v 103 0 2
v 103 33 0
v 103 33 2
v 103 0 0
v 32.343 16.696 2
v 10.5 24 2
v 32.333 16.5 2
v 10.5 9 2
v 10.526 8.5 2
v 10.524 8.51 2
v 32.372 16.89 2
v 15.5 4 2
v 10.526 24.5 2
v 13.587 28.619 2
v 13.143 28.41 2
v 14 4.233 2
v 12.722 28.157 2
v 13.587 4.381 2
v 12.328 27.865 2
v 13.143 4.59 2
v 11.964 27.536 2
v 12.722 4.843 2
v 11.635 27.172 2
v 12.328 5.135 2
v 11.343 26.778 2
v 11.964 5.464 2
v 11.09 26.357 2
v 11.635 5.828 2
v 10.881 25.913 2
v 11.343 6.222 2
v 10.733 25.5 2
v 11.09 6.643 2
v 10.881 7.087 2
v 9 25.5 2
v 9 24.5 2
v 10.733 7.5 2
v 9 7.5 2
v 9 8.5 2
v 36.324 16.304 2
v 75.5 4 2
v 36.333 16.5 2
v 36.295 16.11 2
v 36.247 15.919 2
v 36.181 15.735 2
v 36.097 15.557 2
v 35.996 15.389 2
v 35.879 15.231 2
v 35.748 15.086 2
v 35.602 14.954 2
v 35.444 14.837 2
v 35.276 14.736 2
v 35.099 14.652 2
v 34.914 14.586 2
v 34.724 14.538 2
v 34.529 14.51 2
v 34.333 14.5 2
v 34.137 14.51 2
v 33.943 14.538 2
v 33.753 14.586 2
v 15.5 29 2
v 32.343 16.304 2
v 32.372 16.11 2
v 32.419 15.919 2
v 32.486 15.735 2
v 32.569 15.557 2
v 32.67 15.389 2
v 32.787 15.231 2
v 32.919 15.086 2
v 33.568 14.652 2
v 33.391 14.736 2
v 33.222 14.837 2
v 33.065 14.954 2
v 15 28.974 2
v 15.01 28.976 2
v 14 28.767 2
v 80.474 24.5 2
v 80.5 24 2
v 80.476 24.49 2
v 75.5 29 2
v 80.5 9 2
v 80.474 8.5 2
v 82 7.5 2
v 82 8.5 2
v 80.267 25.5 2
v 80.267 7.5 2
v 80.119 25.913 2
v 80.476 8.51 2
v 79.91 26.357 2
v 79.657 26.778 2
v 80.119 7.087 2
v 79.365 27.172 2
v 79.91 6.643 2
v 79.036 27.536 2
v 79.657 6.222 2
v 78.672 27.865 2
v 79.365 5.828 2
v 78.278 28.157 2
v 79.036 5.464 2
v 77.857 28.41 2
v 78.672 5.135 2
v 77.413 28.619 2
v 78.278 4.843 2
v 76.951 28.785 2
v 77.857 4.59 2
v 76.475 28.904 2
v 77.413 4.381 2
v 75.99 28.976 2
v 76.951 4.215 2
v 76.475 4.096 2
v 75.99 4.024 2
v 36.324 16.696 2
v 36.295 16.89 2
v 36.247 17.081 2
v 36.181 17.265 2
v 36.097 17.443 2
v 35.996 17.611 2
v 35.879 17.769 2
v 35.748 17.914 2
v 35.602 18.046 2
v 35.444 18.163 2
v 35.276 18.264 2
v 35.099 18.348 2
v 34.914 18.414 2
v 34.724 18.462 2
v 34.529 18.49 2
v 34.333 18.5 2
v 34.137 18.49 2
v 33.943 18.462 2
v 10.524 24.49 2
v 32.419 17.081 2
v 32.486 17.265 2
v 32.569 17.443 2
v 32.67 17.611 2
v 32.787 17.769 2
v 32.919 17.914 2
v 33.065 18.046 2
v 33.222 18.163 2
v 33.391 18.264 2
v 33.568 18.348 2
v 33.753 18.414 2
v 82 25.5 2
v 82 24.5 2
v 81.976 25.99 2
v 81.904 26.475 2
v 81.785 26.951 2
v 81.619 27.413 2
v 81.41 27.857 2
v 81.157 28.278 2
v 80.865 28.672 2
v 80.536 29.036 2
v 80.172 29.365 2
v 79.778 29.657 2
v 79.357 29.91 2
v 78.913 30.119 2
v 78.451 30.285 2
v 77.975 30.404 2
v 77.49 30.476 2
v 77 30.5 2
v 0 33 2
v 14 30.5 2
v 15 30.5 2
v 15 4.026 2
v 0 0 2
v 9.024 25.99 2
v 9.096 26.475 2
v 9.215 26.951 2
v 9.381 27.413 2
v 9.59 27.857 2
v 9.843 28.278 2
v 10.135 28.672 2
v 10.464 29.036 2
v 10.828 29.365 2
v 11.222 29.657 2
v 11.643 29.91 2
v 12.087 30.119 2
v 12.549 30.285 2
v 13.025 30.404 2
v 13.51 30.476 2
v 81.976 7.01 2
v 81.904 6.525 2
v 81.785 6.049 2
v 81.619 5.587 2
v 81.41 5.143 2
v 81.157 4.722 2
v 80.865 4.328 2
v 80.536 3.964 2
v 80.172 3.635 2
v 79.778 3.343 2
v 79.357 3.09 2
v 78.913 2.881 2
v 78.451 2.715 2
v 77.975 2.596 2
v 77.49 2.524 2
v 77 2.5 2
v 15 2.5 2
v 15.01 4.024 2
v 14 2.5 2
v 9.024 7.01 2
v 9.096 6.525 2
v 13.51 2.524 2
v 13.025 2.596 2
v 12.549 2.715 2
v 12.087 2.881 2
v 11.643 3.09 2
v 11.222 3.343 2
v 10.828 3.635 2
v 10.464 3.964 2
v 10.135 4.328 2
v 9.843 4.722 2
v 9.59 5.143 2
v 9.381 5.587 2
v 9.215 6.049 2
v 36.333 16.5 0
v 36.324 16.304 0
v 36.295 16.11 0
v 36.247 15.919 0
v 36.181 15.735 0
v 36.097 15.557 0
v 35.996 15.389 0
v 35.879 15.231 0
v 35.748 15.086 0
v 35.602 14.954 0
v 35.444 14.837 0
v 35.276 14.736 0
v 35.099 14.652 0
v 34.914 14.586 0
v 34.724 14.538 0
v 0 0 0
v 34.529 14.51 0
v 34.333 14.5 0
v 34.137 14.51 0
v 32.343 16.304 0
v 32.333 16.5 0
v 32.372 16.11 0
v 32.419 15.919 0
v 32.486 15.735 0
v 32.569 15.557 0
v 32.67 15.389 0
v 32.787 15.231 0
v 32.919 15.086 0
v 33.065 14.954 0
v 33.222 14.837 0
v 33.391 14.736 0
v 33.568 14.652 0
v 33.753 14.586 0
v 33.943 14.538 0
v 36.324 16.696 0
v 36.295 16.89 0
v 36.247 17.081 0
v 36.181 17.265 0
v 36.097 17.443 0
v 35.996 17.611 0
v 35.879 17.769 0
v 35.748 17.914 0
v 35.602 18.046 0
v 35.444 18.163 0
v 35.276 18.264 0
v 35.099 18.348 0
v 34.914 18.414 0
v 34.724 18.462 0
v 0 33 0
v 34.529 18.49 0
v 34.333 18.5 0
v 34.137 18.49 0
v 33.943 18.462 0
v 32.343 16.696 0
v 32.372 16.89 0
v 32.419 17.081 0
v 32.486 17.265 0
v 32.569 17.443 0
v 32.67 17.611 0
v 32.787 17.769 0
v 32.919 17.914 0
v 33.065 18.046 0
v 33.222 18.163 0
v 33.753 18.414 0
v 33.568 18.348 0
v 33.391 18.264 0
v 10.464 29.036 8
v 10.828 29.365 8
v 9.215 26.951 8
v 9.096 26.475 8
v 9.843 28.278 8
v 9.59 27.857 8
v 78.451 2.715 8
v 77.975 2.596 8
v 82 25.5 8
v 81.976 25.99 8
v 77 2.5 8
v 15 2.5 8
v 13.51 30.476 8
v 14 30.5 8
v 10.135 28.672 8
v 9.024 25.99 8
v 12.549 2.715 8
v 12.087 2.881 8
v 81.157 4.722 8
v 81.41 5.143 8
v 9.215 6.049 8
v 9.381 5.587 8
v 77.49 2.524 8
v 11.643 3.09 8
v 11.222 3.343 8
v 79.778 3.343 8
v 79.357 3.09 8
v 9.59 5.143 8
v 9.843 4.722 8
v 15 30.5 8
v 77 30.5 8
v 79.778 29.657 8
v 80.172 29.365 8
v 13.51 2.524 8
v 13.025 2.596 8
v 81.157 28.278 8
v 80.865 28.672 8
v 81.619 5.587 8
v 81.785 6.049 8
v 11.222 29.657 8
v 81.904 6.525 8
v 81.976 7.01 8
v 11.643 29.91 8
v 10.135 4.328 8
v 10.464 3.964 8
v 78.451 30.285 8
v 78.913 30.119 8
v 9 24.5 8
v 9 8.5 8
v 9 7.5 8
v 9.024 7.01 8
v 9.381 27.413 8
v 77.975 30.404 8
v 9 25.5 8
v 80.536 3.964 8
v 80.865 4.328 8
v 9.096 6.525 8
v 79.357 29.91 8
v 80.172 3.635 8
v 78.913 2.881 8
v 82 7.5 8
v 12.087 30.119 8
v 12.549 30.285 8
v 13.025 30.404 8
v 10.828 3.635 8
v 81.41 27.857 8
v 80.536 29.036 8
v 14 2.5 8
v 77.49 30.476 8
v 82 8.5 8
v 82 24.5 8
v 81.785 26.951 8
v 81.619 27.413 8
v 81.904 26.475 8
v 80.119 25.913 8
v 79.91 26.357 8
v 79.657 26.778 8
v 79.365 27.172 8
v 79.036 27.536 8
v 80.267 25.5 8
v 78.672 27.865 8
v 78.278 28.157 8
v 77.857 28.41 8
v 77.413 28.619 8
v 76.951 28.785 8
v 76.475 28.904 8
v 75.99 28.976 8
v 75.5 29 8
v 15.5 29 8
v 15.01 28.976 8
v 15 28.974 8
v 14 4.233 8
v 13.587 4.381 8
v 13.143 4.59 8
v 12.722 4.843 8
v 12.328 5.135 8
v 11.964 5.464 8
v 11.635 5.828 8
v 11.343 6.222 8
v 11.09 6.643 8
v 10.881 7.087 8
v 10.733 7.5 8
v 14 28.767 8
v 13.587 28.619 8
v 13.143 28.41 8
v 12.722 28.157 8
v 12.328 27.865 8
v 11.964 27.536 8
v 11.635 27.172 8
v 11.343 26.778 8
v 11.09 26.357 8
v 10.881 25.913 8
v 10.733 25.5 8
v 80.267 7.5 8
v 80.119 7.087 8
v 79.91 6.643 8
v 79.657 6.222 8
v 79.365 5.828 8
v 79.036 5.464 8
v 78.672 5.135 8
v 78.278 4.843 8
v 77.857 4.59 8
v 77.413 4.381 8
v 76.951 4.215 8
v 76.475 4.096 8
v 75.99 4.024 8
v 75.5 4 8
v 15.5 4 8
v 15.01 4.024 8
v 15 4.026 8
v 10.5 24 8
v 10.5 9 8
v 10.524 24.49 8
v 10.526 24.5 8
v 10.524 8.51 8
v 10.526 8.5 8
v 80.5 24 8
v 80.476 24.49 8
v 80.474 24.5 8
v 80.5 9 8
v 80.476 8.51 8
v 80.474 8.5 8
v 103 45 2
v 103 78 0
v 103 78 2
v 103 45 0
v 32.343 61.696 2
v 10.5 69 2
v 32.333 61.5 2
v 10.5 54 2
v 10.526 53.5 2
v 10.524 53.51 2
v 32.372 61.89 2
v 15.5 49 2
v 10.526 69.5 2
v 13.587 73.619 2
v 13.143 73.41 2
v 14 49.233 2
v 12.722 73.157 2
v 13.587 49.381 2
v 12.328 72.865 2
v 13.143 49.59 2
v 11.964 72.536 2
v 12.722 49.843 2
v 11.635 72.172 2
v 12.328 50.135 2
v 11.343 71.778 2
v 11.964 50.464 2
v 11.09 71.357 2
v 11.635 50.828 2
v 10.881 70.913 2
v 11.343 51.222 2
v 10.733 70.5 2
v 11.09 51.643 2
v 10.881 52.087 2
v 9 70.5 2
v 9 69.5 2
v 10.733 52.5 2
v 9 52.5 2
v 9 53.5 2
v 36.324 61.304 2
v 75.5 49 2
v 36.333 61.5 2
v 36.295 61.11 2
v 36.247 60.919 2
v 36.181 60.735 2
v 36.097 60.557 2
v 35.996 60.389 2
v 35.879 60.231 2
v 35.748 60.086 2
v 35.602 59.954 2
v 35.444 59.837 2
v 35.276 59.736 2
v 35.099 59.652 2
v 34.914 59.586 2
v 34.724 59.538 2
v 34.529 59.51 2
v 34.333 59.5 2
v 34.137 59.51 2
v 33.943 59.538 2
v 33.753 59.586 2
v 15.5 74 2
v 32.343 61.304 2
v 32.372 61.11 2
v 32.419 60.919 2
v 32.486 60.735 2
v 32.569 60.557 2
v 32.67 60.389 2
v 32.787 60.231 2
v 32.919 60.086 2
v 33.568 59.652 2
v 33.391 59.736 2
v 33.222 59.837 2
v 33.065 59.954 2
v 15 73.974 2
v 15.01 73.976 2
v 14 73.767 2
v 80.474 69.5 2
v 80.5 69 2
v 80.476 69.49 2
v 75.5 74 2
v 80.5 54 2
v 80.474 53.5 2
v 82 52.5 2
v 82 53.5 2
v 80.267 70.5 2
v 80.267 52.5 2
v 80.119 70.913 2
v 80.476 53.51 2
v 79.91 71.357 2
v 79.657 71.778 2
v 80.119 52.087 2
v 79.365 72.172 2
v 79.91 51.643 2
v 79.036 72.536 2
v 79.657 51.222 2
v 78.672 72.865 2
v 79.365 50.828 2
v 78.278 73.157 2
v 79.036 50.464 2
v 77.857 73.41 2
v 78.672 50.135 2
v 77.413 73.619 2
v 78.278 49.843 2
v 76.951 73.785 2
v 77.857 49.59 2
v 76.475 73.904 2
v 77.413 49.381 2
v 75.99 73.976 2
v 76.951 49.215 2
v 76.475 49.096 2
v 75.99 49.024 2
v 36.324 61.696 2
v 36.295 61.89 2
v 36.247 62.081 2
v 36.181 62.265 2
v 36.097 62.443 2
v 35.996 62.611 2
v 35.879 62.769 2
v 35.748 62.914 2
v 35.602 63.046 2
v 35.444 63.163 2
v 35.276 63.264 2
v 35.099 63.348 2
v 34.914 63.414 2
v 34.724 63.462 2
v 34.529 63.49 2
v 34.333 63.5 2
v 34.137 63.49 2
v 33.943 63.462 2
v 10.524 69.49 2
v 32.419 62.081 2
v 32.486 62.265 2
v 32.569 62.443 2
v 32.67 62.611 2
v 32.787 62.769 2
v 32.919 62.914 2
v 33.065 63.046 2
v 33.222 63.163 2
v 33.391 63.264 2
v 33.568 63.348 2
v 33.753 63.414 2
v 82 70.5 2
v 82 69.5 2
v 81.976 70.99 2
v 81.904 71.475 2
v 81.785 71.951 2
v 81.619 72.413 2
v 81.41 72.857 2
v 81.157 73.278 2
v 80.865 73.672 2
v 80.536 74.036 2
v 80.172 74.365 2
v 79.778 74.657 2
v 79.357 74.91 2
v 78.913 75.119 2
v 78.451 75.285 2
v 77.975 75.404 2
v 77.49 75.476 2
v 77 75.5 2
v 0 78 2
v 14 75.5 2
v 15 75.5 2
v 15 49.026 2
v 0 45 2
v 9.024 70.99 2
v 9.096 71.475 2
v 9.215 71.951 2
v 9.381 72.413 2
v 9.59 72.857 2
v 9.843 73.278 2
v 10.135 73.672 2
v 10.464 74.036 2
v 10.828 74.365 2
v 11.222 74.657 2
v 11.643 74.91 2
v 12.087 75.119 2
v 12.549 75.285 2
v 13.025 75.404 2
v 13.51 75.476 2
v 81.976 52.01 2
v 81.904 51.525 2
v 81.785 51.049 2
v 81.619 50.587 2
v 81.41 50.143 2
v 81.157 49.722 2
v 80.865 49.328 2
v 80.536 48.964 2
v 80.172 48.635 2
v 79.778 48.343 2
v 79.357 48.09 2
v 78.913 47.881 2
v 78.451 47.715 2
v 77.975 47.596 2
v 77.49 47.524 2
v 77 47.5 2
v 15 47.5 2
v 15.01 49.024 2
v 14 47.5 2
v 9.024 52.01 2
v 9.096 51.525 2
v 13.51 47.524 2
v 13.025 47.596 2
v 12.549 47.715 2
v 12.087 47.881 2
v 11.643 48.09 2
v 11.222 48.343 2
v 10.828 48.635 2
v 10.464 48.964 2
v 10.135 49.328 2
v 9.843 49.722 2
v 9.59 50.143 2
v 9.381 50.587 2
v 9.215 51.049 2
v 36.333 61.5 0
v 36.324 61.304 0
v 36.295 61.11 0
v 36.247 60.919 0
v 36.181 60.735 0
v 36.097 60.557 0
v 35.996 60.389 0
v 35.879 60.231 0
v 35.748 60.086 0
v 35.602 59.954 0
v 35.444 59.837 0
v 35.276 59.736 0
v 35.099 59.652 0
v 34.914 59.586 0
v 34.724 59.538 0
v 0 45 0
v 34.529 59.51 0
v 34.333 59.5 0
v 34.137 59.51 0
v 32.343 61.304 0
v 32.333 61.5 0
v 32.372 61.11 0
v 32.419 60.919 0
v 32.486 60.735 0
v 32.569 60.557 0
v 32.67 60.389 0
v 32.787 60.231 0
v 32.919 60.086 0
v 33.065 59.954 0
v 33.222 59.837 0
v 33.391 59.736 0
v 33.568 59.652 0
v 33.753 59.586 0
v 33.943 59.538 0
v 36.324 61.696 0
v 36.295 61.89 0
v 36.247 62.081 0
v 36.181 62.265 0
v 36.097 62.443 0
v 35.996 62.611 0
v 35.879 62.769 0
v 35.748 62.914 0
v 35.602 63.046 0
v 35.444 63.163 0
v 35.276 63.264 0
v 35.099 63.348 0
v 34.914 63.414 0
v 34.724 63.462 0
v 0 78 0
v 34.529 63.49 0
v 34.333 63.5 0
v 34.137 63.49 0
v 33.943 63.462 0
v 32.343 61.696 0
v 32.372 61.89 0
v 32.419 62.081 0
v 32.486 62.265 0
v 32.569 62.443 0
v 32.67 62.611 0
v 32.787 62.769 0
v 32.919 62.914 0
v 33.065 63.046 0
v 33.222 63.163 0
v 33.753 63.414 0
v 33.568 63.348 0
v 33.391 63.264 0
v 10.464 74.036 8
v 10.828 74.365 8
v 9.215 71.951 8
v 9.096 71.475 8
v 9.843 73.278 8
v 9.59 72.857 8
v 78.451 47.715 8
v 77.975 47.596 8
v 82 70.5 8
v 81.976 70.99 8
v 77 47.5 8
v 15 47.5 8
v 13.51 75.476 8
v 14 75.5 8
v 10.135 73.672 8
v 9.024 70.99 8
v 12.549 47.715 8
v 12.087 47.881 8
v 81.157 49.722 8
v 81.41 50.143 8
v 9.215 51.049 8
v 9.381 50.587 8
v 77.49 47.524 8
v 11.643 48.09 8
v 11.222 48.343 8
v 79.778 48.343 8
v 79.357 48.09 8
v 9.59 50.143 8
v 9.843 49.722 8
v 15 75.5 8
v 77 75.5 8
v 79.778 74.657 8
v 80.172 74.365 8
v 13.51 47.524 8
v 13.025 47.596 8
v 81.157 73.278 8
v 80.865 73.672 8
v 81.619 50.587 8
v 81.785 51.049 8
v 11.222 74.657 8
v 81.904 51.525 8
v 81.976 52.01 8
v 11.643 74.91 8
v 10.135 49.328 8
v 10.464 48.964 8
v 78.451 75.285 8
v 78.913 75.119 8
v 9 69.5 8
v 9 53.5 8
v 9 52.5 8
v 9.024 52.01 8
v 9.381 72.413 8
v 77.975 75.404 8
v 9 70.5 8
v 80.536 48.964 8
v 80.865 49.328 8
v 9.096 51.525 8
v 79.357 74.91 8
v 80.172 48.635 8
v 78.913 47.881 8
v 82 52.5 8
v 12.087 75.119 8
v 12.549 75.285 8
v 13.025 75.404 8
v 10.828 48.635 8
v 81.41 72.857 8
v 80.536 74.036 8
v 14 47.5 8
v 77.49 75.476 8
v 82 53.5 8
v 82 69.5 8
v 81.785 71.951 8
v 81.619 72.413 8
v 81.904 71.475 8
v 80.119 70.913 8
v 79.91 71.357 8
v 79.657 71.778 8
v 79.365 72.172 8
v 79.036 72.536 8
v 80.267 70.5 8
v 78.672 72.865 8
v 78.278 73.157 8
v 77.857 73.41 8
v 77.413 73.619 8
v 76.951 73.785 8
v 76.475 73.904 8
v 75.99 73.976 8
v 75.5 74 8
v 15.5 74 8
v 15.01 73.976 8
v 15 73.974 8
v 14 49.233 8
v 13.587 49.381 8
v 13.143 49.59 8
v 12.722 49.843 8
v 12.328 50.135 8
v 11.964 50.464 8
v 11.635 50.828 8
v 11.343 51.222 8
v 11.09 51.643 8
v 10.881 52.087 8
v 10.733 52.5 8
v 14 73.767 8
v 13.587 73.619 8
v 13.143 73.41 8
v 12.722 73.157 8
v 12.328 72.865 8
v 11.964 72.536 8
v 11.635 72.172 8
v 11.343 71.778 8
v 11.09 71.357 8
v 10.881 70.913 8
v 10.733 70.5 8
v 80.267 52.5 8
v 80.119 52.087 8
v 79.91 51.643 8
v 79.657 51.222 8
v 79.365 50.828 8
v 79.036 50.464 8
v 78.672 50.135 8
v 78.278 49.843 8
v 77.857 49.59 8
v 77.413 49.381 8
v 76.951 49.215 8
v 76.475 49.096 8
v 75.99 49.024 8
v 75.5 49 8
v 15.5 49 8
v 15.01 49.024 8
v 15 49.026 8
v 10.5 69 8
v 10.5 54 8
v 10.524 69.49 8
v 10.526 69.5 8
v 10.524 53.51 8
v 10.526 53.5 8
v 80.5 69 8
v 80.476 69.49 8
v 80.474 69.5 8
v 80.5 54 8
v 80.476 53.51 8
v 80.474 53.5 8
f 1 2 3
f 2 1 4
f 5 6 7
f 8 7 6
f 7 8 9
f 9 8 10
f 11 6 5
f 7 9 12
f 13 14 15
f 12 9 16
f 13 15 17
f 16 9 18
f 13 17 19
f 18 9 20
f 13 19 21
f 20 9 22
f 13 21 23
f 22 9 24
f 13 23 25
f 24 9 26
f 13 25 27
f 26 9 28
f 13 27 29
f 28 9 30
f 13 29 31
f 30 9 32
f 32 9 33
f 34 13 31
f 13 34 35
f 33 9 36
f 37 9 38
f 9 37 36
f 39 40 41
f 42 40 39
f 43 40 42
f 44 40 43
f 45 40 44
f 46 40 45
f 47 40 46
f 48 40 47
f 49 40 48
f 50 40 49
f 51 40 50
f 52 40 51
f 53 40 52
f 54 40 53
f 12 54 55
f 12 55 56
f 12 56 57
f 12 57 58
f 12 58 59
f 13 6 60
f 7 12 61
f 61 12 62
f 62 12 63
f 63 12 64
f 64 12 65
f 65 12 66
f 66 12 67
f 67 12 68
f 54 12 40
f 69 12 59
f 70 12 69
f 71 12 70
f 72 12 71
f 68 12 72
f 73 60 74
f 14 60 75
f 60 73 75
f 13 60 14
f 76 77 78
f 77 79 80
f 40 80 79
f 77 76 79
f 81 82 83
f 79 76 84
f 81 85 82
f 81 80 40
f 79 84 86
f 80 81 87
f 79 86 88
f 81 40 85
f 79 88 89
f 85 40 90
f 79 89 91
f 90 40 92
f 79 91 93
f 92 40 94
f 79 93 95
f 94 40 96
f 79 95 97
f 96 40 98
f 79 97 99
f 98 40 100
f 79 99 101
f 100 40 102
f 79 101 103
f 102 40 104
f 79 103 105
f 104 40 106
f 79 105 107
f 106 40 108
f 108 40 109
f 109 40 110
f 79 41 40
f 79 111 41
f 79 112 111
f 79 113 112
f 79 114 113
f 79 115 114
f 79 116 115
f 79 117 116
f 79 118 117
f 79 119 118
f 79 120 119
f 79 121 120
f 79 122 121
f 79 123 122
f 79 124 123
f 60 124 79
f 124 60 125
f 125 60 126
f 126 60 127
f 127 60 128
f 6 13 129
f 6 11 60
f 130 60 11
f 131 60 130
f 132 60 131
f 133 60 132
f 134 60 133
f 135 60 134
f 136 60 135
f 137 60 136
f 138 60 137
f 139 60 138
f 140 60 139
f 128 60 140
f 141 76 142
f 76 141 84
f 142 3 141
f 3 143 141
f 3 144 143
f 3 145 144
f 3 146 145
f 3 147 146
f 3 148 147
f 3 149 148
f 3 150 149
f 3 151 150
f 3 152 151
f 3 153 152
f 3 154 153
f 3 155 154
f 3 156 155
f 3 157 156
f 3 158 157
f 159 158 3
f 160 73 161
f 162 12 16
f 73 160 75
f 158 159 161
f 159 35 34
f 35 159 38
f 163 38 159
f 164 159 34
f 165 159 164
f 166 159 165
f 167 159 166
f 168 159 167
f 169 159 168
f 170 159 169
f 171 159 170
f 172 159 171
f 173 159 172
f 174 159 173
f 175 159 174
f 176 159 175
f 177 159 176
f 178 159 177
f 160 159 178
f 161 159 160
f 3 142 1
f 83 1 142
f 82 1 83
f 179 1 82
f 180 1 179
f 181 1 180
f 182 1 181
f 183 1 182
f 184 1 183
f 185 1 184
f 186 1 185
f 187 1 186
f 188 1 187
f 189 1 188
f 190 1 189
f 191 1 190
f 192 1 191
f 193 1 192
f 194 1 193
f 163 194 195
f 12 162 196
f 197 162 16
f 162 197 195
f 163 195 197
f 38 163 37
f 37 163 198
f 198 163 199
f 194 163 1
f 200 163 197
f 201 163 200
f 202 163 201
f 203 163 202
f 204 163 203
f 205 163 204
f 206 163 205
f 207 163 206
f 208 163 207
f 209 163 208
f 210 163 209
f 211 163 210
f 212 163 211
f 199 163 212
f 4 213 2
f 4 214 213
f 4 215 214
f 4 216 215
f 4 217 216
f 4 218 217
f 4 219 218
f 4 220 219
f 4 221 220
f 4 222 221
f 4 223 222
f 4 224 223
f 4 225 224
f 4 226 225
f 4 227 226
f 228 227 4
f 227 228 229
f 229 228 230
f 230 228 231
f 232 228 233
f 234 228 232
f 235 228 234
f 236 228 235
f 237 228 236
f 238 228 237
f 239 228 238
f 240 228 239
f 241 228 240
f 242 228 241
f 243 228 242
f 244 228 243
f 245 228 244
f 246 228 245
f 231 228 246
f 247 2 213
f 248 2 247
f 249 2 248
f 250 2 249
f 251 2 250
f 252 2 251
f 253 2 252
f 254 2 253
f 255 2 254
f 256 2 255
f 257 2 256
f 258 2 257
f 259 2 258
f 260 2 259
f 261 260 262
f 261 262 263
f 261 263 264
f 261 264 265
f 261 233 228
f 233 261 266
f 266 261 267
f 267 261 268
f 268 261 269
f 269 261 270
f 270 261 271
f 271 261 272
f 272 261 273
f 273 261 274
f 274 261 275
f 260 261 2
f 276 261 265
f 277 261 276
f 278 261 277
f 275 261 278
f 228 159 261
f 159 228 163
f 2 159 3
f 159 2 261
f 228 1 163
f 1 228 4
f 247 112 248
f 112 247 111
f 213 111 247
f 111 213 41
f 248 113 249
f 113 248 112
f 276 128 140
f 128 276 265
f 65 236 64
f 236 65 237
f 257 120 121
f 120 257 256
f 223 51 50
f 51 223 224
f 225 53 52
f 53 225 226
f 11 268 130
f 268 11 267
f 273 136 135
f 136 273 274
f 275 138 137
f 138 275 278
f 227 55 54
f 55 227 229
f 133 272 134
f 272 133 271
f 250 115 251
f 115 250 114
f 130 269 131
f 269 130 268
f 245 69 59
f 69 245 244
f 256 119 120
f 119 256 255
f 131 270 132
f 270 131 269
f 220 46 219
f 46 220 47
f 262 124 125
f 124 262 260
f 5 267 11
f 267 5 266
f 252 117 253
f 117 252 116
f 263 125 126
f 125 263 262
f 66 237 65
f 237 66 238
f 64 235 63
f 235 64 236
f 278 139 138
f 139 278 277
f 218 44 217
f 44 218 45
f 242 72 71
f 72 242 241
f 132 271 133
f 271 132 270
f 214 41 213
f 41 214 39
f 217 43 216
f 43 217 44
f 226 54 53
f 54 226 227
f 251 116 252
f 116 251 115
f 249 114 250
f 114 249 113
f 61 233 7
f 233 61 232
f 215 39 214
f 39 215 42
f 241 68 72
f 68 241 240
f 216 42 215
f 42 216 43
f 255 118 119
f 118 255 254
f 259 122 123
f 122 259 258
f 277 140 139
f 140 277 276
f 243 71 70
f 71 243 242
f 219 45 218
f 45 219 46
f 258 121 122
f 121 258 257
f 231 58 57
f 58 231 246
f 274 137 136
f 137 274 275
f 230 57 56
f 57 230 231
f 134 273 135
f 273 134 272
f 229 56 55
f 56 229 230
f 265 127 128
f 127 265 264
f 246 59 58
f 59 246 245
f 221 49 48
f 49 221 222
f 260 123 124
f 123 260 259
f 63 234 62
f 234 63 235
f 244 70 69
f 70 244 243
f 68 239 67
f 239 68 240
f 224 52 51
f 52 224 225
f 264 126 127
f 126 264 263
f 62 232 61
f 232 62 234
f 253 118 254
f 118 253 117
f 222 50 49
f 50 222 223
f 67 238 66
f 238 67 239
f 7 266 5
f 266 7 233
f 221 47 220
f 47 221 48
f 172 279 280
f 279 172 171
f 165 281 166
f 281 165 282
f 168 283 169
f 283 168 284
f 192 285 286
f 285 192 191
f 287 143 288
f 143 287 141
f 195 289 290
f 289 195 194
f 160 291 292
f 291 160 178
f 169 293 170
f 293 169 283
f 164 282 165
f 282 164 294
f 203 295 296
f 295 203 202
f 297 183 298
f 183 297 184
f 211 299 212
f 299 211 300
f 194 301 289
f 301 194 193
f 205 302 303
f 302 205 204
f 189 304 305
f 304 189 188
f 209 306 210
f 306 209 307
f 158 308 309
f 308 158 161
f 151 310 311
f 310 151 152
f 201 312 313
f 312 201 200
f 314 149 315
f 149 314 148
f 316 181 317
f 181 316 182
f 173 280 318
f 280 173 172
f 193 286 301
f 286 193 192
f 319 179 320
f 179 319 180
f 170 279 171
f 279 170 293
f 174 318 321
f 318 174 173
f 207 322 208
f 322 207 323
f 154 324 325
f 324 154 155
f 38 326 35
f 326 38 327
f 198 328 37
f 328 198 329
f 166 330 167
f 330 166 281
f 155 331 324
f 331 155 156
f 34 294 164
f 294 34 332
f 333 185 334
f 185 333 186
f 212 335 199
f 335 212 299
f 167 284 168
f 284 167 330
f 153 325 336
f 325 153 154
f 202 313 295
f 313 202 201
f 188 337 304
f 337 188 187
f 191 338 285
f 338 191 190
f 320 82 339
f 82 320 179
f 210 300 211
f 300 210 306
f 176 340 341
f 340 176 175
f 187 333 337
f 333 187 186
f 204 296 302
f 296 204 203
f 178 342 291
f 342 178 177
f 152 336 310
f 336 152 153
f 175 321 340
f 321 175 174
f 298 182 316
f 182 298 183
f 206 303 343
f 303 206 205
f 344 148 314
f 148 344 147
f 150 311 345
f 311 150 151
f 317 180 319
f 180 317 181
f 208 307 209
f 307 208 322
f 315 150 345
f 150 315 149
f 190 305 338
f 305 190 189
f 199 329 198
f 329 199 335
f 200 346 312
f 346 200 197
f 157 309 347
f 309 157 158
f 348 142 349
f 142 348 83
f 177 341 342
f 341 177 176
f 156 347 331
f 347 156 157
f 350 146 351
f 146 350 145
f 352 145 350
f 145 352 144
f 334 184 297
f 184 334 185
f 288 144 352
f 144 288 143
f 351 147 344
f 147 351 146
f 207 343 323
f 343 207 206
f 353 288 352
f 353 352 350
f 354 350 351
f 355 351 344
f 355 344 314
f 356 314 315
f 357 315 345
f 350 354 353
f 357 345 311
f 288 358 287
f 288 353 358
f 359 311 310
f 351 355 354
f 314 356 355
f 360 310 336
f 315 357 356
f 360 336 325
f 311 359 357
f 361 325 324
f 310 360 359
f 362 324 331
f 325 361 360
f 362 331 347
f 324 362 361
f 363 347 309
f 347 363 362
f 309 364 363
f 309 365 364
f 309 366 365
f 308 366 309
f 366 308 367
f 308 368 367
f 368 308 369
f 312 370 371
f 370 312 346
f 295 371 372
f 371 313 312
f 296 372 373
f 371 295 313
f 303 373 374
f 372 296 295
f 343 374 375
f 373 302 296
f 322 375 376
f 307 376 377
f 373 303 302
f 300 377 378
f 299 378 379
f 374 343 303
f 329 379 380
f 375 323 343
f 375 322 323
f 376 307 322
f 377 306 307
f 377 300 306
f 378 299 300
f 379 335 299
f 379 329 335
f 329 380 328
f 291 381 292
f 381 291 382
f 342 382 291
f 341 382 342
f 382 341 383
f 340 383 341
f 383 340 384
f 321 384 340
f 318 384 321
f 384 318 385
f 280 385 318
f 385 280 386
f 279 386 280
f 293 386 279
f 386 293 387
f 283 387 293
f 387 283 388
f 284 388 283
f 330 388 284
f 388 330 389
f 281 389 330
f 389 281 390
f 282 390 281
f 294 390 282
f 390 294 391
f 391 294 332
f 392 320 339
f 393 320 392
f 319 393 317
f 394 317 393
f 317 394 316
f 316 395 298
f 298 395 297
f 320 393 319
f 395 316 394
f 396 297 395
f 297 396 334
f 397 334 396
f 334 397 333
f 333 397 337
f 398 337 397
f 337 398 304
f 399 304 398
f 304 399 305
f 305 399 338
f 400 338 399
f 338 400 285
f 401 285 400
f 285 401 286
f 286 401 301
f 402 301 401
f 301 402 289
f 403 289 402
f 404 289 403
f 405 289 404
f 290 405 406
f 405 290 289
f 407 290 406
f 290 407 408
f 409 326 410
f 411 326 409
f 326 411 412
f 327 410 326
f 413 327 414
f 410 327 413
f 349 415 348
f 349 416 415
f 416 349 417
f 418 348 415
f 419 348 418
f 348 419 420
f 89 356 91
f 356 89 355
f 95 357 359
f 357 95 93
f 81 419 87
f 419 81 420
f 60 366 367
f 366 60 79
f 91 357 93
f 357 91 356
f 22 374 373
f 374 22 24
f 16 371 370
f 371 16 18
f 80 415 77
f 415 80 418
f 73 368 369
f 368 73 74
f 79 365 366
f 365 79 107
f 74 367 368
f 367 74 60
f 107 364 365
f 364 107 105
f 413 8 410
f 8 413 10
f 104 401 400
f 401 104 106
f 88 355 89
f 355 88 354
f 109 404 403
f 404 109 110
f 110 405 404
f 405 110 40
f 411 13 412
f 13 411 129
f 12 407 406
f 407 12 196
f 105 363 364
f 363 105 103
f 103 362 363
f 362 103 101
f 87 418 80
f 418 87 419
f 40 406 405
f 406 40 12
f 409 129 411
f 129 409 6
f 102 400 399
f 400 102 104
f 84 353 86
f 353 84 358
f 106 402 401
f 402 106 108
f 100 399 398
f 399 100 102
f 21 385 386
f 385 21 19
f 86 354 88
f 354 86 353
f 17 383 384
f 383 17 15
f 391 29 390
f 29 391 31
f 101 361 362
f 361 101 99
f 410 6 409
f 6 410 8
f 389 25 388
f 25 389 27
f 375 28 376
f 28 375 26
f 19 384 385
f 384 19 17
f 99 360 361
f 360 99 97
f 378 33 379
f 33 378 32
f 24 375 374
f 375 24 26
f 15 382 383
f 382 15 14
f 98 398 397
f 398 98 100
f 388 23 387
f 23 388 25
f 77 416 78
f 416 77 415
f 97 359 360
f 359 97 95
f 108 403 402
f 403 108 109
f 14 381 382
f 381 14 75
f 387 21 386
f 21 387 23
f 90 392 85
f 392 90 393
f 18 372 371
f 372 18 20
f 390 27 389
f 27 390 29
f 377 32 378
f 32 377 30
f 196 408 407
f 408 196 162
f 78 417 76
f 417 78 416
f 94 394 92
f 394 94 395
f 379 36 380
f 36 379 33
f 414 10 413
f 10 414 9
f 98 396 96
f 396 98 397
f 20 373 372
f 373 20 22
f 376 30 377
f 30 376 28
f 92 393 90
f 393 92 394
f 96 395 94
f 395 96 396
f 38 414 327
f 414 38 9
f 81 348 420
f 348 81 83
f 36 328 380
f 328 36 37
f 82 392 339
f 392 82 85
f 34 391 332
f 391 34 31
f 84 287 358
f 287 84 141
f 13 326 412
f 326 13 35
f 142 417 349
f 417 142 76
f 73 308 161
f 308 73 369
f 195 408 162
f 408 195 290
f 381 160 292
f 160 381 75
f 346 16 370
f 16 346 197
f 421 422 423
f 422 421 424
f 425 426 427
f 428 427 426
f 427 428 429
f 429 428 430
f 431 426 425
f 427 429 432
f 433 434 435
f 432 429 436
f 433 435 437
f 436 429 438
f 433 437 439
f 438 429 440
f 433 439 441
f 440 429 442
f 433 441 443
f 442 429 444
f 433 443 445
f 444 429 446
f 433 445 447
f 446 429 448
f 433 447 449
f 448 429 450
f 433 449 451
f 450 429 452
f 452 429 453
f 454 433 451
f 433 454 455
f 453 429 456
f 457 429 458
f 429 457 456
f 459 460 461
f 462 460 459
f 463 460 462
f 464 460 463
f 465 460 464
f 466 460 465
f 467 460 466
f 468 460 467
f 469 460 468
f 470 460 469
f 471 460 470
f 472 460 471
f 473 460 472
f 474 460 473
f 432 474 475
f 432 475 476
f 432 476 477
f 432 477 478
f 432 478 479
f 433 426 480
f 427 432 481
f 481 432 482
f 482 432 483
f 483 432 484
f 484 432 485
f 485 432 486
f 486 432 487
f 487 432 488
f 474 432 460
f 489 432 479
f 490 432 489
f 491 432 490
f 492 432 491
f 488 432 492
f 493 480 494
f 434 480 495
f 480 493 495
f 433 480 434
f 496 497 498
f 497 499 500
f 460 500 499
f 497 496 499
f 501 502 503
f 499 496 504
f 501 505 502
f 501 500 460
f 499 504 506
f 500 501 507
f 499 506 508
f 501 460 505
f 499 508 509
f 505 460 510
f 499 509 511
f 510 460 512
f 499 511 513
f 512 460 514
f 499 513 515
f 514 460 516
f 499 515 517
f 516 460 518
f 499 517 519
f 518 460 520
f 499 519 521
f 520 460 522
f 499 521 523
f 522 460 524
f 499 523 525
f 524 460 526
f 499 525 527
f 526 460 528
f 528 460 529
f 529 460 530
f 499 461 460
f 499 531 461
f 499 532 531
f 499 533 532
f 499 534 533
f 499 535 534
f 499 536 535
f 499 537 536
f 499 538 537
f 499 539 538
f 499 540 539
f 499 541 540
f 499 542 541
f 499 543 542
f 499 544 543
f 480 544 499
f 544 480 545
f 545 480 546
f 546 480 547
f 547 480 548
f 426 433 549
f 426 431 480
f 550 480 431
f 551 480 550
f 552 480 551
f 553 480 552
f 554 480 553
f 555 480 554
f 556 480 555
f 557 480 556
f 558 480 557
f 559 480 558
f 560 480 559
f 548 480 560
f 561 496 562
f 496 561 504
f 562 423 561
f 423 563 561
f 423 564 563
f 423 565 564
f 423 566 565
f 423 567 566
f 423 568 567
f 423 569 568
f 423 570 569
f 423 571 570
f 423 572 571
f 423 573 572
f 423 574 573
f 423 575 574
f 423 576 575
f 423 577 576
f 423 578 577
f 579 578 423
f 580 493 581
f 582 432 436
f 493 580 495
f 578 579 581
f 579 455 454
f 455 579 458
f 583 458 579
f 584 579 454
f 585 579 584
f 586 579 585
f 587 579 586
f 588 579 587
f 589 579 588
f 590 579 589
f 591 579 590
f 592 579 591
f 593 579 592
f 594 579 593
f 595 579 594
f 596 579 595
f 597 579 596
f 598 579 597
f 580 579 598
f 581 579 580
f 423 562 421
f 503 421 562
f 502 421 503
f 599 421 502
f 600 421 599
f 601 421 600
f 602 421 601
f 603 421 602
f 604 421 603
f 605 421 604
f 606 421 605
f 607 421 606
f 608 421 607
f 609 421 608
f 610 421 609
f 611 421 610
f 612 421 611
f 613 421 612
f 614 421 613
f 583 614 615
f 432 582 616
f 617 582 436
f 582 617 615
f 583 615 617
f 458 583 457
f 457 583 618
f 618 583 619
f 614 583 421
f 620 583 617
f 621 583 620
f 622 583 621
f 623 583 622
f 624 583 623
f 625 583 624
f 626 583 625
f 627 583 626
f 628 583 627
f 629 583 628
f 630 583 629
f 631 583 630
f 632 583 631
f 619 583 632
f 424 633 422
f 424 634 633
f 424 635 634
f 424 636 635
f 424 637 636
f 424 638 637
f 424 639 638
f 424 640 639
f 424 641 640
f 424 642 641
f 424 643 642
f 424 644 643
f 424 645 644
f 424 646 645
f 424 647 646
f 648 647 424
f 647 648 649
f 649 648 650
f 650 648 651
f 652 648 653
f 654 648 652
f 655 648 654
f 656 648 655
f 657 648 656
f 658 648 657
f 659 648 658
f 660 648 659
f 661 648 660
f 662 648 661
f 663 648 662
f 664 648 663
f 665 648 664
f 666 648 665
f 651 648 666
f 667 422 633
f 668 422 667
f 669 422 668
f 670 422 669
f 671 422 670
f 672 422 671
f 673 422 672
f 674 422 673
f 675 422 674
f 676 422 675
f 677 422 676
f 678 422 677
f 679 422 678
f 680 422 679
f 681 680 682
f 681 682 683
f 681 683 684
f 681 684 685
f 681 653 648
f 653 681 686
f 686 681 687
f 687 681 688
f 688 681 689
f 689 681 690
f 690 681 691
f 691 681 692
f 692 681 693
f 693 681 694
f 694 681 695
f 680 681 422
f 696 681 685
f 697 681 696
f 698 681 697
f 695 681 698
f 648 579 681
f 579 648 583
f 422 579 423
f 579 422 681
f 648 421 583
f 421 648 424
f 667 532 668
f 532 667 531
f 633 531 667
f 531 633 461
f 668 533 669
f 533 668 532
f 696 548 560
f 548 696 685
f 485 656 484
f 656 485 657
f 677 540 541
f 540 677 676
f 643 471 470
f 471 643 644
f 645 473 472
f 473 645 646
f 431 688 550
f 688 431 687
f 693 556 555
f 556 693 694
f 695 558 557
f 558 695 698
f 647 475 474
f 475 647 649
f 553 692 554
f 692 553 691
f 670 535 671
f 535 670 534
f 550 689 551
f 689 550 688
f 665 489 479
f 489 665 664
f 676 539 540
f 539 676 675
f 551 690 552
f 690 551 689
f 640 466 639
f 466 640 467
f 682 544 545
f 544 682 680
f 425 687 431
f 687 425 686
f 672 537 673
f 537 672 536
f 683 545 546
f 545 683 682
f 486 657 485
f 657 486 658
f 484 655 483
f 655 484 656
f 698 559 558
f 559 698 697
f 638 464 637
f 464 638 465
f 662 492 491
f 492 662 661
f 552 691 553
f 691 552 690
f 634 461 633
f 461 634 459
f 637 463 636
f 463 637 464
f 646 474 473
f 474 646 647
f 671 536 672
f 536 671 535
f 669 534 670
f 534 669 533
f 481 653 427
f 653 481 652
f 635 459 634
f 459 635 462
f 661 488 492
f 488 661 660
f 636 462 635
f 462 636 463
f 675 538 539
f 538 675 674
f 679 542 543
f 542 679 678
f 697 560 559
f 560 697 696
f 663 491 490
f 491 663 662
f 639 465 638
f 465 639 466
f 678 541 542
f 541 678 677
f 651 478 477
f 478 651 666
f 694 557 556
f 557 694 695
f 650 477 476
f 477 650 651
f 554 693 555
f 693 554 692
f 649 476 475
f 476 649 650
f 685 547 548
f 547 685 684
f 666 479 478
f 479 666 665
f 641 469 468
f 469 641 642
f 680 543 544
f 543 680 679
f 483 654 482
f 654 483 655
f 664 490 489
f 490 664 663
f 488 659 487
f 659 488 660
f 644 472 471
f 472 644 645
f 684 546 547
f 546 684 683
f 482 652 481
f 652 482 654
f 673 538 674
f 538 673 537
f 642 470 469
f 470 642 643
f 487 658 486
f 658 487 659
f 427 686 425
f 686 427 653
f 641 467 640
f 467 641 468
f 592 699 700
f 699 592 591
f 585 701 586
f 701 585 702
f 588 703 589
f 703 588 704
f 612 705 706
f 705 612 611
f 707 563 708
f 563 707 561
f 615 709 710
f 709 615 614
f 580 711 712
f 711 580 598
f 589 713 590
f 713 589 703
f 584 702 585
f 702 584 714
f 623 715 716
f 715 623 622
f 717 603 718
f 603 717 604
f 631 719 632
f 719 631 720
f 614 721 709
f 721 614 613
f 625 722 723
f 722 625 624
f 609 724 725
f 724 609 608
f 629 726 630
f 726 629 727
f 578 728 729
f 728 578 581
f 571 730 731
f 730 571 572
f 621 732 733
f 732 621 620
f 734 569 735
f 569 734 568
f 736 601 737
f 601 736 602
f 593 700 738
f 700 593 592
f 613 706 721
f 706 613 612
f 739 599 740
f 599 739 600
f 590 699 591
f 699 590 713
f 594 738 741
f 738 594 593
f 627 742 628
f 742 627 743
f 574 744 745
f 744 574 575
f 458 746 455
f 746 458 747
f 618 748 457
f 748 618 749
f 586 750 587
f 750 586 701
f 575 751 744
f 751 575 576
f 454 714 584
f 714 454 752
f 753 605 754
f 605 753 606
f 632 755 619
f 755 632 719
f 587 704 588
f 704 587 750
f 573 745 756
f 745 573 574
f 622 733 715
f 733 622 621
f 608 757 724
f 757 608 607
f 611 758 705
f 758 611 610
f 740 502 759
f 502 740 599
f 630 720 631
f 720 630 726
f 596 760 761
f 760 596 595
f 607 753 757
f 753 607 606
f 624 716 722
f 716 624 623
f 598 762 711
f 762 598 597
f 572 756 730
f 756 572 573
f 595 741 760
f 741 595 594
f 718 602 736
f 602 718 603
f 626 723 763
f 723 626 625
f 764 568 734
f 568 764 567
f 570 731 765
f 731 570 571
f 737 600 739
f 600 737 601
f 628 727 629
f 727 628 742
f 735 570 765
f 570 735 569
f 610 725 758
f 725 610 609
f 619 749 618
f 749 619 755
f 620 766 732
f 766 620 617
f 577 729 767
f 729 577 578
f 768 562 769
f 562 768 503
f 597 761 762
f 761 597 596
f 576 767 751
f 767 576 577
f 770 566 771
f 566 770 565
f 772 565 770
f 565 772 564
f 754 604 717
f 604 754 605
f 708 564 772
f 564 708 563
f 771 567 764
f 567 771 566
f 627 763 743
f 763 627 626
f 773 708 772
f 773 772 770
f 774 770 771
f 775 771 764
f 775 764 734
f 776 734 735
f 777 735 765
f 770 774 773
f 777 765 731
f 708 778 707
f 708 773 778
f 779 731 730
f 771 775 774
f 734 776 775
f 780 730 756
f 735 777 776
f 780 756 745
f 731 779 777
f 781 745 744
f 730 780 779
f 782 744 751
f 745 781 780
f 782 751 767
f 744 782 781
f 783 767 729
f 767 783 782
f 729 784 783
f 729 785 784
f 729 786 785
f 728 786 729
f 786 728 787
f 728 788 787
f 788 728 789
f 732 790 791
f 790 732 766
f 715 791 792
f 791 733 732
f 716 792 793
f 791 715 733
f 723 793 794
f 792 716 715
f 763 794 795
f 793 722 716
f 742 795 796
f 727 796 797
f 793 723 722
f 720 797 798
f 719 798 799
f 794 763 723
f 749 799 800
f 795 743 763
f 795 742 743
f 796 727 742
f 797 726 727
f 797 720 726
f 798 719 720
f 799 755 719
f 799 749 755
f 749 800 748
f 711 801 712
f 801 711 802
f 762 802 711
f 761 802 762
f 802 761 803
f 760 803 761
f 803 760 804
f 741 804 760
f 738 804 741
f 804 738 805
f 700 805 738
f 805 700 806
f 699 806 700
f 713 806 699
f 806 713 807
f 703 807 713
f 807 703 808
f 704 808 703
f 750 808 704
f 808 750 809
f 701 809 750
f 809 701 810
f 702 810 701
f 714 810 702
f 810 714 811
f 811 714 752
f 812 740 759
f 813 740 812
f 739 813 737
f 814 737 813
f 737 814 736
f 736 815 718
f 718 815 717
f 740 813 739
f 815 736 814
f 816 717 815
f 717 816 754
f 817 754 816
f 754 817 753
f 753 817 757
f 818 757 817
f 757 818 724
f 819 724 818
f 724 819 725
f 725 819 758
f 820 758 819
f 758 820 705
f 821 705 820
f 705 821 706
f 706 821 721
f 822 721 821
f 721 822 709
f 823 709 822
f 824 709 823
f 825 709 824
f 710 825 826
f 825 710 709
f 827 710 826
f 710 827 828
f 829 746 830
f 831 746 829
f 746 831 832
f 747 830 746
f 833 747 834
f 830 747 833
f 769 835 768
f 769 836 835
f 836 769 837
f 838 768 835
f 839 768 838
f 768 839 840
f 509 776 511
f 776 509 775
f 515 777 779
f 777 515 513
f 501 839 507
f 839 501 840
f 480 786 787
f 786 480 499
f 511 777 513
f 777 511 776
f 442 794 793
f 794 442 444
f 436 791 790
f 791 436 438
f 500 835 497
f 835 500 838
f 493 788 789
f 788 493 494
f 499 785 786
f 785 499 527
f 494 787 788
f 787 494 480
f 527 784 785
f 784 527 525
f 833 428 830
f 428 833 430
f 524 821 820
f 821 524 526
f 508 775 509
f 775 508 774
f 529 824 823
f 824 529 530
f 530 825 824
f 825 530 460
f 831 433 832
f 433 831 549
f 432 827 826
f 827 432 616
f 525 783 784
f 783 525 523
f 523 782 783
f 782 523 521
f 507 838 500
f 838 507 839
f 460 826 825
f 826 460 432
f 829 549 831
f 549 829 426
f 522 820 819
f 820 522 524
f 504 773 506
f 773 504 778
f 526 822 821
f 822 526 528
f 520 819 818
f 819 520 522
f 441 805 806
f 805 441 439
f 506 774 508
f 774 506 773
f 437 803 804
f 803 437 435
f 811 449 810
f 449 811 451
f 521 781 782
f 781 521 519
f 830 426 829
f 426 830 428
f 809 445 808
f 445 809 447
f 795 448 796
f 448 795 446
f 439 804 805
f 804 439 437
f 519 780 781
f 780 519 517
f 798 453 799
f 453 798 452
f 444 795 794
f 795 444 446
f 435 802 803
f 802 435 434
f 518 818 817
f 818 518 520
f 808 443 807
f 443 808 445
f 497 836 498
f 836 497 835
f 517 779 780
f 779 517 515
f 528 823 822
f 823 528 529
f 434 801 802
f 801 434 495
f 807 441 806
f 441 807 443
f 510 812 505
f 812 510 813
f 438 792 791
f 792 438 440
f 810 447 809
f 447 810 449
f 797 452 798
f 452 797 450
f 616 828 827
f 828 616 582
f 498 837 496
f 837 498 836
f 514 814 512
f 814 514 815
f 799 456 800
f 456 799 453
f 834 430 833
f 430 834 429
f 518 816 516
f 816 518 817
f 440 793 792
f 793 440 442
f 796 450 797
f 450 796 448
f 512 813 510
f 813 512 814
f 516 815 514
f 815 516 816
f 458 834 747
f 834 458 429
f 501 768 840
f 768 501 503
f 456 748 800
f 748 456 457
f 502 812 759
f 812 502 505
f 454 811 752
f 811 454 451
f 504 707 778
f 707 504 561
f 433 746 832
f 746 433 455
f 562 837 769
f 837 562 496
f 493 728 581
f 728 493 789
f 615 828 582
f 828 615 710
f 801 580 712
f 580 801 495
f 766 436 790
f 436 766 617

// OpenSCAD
dx = 103;
dy = 33;
dwidth = 2;
hx = 73;
hy = 28;
hwidth = 1.5;
hrad = 5;
offhx = 9;
offhy = 2.5;

$fn=64;
module innenteil(h=6, w=0) {
    hull() {
        // unten link
        translate([offhx+hrad+w, offhy+hrad+w, 0]) cylinder(r=hrad, h=h);
        // oben links
        translate([offhx+hrad+w, offhy-hrad+hy-w, 0]) cylinder(r=hrad, h=h);
        // unten rechts
        translate([offhx+hrad+hx-2*hrad-w, offhy+hrad+w, 0]) cylinder(r=hrad, h=h);
        // oben rechts
        translate([offhx+hrad+hx-2*hrad-w, offhy-hrad+hy-w, 0]) cylinder(r=hrad, h=h);
    }
}

module abdeckung() {
    // Deckel
    difference(){ 
        cube([dx, dy, dwidth]);
        translate([dx/3,dy/2,0]) cylinder(r=2, h=40, center=true);
    }
    difference() {
        translate([0,0,dwidth]) innenteil();
        translate([0,0,dwidth-1])innenteil(h=8, w=1.5);
        translate([0,offhy+hrad,-0.1]) cube([dx,1,15]);
        translate([0,offhy+hy-hrad-1,-0.1]) cube([dx,1,15]);
        translate([offhx+hrad,0,-0.1]) cube([1,dy,15]);
        translate([offhx+hx+hrad-1,0,-0.1]) cube([1,dy,15]);
    }
}

abdeckung();
translate([0,45,0]) abdeckung();
